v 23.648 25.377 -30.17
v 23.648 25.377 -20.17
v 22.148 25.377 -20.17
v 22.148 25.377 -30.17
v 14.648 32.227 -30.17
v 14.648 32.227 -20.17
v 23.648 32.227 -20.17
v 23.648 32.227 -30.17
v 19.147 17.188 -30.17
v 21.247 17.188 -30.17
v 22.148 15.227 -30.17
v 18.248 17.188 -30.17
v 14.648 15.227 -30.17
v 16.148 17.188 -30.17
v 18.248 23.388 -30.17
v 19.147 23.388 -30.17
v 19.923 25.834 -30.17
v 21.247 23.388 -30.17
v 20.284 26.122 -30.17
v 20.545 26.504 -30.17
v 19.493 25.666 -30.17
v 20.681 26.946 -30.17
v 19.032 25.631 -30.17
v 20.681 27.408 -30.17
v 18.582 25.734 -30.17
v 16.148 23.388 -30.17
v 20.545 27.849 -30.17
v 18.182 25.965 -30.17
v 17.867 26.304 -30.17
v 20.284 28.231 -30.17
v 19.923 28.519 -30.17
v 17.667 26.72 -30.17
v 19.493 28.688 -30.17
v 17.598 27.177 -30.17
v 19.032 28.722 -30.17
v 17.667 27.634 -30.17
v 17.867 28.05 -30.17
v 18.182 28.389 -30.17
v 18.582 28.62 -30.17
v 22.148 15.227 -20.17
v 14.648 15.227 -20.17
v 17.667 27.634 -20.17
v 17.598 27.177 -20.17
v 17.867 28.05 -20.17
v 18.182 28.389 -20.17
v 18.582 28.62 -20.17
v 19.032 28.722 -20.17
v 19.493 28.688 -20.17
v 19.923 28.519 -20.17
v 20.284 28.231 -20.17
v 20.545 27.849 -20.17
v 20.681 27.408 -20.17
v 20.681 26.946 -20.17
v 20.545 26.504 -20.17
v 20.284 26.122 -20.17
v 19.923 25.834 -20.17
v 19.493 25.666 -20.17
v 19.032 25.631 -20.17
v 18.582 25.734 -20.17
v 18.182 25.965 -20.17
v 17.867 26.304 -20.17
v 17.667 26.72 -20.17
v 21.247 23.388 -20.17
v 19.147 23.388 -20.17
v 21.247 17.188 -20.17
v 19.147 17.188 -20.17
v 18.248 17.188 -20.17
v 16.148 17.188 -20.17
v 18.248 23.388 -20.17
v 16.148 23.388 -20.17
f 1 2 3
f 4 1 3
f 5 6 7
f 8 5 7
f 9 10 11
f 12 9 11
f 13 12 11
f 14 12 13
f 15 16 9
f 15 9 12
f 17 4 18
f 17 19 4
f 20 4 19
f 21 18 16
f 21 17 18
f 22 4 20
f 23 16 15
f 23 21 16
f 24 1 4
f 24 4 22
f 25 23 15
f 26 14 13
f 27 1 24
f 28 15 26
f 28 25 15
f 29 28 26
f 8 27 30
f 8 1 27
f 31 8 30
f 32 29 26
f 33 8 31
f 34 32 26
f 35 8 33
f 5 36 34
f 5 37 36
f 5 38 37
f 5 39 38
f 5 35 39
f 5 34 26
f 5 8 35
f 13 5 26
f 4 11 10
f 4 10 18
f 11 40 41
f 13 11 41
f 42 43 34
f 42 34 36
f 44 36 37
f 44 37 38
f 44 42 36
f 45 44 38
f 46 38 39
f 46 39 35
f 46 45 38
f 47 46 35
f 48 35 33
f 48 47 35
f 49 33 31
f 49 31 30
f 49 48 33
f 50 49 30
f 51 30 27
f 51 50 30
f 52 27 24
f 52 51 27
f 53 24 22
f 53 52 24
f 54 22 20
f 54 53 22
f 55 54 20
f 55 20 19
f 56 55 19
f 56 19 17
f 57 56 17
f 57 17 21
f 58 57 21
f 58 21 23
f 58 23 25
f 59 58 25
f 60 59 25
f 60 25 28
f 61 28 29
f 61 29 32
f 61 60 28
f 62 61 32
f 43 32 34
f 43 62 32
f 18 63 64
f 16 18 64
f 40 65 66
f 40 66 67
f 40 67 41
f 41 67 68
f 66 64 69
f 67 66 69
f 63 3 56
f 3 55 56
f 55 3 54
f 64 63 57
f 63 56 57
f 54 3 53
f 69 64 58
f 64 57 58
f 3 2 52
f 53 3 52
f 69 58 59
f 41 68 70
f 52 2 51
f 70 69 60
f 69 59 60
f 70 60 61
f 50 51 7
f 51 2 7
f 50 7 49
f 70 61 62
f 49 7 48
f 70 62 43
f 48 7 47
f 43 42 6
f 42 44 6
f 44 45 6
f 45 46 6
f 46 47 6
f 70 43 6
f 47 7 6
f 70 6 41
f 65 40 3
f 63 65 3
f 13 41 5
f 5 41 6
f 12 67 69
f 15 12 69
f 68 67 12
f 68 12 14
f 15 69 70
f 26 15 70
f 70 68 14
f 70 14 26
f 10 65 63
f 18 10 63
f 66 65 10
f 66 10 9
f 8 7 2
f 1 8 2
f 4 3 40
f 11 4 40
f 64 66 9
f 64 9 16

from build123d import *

# Parameters (mm, degrees)
SKIZZE2_R                       = 1.55
SKIZZE2_W                       = 2.1
SKIZZE2_H                       = 6.2
AUFSATZ_LINEAR_AUSTRAGEN1_DEPTH = 10


with BuildPart() as part:
    # Skizze2 → Aufsatz-Linear austragen1 (new body)
    with BuildSketch(Plane(origin=(0, 0, -20.169507331), x_dir=(-1, 0, 0), z_dir=(0, 0, -1))):
        Polygon((-22.148061032, 15.226980034), (-19.148061032, 15.226980034), (-16.448061032, 15.226980034), (-16.148061032, 15.226980034), (-14.648061032, 15.226980034), (-14.648061032, 25.377216735), (-14.648061032, 32.226980034), (-19.148061032, 32.226980034), (-23.648061032, 32.226980034), (-23.648061032, 25.377216735), (-22.148061032, 25.377216735), align=None)
        with Locations((-19.148061032, 27.176743334)):
            Circle(SKIZZE2_R, mode=Mode.SUBTRACT)
        with Locations((-17.198061032, 20.288222167)):
            Rectangle(SKIZZE2_W, SKIZZE2_H, mode=Mode.SUBTRACT)
        with Locations((-20.196983303, 20.288222167)):
            Rectangle(SKIZZE2_W, SKIZZE2_H, mode=Mode.SUBTRACT)
    extrude(amount=AUFSATZ_LINEAR_AUSTRAGEN1_DEPTH)


solid = part.part
